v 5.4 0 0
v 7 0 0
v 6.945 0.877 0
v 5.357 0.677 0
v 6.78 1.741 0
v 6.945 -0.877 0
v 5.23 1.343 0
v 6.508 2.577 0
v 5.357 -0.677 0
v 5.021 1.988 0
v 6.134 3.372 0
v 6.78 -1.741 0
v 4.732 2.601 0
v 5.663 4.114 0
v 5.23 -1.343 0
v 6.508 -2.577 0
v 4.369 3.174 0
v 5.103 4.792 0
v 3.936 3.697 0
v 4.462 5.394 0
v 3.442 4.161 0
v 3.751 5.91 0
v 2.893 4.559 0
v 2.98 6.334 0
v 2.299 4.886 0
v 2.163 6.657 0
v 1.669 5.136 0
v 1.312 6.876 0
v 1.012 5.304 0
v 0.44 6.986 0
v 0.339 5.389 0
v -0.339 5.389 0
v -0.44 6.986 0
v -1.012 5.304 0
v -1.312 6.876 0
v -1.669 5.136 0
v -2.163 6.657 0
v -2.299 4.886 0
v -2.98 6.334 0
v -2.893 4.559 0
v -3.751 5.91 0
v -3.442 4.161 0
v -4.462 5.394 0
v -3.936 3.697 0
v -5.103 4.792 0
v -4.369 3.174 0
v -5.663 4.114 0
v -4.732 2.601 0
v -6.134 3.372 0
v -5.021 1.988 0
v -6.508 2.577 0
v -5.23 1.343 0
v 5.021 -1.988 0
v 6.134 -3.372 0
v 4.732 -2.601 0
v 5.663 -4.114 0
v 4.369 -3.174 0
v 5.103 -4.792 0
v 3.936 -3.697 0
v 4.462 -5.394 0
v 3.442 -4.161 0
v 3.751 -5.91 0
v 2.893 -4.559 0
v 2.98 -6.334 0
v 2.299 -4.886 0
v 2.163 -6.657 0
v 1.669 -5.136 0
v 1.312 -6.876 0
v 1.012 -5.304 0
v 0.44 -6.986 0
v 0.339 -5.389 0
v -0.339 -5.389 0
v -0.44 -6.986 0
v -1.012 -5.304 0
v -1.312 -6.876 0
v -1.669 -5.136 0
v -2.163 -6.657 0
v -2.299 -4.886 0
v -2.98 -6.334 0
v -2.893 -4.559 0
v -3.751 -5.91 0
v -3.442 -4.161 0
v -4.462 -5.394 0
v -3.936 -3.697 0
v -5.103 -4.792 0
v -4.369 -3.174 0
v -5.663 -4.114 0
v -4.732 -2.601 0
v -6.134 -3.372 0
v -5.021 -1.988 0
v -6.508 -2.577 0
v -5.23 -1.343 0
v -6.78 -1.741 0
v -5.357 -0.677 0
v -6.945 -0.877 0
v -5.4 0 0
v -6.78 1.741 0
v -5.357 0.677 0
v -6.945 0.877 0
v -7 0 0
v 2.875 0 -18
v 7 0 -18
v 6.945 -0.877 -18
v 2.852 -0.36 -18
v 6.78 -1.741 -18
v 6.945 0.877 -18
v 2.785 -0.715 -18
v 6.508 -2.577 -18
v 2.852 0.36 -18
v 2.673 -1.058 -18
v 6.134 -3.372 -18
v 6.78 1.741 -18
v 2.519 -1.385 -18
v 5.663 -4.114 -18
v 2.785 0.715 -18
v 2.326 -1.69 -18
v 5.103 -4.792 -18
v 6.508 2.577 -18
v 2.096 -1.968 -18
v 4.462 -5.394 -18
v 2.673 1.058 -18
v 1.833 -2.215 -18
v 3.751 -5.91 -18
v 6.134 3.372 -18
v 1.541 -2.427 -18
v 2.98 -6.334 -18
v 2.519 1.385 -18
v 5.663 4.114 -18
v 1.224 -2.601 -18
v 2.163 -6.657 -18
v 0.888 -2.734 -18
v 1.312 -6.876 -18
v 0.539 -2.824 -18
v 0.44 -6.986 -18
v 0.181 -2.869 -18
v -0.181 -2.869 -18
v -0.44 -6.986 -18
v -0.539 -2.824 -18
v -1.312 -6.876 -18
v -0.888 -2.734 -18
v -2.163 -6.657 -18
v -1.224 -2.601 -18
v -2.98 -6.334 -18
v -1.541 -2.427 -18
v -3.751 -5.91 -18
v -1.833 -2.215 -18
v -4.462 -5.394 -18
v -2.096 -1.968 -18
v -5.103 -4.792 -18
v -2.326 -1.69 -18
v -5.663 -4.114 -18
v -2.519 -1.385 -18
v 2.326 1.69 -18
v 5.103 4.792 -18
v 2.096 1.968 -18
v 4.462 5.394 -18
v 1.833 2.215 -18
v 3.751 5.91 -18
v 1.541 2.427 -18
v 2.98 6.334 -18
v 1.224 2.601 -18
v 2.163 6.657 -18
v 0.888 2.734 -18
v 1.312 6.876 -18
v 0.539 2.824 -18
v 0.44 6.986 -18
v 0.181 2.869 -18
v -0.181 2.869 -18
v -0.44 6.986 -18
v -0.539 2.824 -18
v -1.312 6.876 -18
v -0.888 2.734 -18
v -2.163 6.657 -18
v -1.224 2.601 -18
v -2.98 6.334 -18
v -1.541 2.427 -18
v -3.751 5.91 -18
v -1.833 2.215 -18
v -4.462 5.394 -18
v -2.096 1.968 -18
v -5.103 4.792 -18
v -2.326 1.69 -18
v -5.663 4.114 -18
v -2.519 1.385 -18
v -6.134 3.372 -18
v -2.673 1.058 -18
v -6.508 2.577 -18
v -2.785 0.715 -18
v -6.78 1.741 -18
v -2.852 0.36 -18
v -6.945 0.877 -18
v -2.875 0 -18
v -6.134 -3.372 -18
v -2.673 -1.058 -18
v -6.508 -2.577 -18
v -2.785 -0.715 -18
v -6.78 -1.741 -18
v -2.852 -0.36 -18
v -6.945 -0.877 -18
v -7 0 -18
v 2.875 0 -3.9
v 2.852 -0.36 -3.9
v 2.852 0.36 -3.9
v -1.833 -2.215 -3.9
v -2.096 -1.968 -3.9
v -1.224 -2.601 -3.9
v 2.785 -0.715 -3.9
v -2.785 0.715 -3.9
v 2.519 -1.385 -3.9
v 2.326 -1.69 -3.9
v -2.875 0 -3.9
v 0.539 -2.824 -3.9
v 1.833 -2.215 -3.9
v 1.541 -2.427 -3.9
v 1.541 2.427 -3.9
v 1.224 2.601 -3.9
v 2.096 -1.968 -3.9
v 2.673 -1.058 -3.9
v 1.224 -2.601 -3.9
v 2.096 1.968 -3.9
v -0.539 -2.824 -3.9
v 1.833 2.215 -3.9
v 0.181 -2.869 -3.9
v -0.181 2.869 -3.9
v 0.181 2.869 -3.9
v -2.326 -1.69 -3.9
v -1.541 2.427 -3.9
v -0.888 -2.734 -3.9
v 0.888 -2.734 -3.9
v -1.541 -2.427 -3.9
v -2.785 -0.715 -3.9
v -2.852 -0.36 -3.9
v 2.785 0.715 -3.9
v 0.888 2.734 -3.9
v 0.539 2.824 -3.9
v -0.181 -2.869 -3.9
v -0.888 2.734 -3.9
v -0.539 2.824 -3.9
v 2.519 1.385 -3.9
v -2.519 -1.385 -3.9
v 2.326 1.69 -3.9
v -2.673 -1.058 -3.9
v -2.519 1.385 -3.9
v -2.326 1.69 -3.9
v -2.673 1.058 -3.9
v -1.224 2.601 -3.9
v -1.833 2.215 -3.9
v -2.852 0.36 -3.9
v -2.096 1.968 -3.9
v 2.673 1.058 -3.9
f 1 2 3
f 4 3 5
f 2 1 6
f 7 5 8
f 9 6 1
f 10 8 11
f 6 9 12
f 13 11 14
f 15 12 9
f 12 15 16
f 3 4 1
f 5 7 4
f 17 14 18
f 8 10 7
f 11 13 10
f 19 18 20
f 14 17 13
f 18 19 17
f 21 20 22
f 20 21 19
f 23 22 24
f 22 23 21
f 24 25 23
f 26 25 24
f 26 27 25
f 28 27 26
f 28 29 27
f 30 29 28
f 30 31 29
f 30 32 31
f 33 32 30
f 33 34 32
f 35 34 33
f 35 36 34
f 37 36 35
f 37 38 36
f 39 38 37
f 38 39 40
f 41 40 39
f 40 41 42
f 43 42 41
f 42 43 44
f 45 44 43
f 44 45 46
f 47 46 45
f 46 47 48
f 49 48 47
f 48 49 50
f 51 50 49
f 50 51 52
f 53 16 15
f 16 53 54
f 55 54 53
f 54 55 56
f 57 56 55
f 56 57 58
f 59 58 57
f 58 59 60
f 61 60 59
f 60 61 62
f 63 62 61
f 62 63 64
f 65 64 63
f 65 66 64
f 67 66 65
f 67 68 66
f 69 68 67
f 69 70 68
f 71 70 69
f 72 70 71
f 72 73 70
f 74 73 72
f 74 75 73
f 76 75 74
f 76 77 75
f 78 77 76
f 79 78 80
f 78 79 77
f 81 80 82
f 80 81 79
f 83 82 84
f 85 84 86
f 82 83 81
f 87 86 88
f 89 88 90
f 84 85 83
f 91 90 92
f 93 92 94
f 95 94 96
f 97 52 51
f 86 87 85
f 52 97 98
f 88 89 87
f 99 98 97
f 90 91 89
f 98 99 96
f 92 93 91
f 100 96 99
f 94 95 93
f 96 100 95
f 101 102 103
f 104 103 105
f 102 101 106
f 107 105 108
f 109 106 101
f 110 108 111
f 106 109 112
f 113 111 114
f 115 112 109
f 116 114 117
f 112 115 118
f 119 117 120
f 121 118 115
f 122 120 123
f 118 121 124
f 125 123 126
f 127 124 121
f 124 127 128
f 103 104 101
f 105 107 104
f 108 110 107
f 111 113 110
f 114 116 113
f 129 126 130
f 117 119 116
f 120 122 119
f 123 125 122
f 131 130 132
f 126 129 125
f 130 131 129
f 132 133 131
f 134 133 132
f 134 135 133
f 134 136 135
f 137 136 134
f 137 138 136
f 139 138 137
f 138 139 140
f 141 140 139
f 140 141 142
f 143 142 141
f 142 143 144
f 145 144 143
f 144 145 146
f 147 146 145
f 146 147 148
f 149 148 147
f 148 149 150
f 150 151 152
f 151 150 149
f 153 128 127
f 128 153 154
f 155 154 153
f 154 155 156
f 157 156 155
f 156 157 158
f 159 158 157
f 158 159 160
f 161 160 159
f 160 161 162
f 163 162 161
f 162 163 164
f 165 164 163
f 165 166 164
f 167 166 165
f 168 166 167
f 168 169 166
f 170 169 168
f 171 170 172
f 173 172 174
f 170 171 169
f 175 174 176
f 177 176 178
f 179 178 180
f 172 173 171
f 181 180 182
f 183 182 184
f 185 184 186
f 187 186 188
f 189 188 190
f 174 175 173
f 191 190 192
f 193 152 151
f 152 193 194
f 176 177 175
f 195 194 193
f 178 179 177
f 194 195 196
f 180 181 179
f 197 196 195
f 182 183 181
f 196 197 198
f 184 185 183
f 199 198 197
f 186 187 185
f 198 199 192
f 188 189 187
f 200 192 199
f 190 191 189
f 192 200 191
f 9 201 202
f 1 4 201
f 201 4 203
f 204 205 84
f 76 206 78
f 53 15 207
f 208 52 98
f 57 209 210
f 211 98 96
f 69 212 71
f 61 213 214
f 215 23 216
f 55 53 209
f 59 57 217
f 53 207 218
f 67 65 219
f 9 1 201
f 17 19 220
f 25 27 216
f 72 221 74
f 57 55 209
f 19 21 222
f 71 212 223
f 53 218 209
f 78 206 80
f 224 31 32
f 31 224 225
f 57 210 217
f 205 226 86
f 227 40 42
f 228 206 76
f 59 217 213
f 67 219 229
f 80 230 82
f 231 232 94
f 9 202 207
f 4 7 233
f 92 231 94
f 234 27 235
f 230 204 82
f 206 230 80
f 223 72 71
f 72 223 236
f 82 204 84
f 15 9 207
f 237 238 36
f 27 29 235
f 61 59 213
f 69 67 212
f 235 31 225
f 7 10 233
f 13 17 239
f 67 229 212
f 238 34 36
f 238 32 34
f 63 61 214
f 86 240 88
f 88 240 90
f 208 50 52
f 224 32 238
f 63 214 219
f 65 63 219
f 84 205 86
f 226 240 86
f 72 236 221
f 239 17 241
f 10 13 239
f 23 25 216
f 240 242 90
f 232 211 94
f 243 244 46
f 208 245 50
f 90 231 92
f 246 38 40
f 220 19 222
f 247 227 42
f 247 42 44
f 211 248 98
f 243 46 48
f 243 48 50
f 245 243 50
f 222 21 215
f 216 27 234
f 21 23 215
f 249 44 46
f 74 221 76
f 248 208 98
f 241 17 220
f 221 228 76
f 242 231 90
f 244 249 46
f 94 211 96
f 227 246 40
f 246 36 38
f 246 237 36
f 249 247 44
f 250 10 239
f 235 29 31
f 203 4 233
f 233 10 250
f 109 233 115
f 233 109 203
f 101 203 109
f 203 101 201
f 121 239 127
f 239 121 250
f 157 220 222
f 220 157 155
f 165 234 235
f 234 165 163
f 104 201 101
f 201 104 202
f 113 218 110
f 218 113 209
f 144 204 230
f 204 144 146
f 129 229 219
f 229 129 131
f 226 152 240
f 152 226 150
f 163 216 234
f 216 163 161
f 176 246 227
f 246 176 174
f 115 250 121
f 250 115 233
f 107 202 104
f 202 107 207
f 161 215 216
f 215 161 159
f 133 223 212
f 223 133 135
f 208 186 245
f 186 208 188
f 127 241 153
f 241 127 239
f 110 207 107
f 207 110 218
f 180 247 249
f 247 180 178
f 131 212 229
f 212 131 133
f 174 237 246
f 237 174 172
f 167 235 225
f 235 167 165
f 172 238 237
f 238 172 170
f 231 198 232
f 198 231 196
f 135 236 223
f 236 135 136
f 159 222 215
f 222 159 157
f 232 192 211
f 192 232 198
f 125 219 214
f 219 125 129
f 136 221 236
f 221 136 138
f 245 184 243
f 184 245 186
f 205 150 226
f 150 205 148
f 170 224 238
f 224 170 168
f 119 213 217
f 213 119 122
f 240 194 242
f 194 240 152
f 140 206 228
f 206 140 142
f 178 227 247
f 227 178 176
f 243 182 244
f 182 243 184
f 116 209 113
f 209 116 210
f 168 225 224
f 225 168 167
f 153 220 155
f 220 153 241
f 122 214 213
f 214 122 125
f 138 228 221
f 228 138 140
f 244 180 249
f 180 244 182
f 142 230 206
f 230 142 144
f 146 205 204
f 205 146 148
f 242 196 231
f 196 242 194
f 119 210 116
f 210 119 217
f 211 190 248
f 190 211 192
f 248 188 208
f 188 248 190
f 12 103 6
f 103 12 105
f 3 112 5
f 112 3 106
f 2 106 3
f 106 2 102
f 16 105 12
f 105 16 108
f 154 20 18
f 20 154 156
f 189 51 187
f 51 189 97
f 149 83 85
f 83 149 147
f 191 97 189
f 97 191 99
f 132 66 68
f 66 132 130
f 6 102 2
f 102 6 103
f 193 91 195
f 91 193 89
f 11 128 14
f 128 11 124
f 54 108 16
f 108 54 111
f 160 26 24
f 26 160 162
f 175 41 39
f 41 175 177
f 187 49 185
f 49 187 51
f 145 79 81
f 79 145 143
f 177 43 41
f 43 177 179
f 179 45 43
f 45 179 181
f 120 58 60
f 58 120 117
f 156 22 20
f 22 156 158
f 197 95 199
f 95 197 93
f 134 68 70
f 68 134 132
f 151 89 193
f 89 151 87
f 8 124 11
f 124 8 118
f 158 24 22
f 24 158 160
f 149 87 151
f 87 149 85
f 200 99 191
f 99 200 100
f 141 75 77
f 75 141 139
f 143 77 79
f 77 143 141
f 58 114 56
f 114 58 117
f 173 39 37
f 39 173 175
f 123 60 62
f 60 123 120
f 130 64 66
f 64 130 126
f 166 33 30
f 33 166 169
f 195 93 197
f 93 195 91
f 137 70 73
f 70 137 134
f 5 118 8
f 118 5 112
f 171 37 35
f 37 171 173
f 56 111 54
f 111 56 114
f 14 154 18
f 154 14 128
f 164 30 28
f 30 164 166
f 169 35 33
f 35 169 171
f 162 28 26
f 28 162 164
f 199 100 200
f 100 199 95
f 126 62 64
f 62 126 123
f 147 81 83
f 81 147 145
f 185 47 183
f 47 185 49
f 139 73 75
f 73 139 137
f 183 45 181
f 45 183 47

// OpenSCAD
$fn = 50;


difference() {
	union() {
		translate(v = [0, 0, -18.0000000000]) {
			cylinder(h = 18, r = 7.0000000000);
		}
		cylinder(h = 0, r = 17.0000000000);
	}
	union() {
		translate(v = [0, 0, 0]) {
			rotate(a = [0, 0, 0]) {
				difference() {
					union() {
						#translate(v = [0, 0, -18.0000000000]) {
							cylinder(h = 18, r = 2.6000000000);
						}
						#translate(v = [0, 0, -3.9000000000]) {
							cylinder(h = 3.9000000000, r1 = 2.8750000000, r2 = 5.4000000000);
						}
						#translate(v = [0, 0, -18.0000000000]) {
							cylinder(h = 18, r = 2.8750000000);
						}
						#translate(v = [0, 0, -18.0000000000]) {
							cylinder(h = 18, r = 2.6000000000);
						}
					}
					union();
				}
			}
		}
	}
}
